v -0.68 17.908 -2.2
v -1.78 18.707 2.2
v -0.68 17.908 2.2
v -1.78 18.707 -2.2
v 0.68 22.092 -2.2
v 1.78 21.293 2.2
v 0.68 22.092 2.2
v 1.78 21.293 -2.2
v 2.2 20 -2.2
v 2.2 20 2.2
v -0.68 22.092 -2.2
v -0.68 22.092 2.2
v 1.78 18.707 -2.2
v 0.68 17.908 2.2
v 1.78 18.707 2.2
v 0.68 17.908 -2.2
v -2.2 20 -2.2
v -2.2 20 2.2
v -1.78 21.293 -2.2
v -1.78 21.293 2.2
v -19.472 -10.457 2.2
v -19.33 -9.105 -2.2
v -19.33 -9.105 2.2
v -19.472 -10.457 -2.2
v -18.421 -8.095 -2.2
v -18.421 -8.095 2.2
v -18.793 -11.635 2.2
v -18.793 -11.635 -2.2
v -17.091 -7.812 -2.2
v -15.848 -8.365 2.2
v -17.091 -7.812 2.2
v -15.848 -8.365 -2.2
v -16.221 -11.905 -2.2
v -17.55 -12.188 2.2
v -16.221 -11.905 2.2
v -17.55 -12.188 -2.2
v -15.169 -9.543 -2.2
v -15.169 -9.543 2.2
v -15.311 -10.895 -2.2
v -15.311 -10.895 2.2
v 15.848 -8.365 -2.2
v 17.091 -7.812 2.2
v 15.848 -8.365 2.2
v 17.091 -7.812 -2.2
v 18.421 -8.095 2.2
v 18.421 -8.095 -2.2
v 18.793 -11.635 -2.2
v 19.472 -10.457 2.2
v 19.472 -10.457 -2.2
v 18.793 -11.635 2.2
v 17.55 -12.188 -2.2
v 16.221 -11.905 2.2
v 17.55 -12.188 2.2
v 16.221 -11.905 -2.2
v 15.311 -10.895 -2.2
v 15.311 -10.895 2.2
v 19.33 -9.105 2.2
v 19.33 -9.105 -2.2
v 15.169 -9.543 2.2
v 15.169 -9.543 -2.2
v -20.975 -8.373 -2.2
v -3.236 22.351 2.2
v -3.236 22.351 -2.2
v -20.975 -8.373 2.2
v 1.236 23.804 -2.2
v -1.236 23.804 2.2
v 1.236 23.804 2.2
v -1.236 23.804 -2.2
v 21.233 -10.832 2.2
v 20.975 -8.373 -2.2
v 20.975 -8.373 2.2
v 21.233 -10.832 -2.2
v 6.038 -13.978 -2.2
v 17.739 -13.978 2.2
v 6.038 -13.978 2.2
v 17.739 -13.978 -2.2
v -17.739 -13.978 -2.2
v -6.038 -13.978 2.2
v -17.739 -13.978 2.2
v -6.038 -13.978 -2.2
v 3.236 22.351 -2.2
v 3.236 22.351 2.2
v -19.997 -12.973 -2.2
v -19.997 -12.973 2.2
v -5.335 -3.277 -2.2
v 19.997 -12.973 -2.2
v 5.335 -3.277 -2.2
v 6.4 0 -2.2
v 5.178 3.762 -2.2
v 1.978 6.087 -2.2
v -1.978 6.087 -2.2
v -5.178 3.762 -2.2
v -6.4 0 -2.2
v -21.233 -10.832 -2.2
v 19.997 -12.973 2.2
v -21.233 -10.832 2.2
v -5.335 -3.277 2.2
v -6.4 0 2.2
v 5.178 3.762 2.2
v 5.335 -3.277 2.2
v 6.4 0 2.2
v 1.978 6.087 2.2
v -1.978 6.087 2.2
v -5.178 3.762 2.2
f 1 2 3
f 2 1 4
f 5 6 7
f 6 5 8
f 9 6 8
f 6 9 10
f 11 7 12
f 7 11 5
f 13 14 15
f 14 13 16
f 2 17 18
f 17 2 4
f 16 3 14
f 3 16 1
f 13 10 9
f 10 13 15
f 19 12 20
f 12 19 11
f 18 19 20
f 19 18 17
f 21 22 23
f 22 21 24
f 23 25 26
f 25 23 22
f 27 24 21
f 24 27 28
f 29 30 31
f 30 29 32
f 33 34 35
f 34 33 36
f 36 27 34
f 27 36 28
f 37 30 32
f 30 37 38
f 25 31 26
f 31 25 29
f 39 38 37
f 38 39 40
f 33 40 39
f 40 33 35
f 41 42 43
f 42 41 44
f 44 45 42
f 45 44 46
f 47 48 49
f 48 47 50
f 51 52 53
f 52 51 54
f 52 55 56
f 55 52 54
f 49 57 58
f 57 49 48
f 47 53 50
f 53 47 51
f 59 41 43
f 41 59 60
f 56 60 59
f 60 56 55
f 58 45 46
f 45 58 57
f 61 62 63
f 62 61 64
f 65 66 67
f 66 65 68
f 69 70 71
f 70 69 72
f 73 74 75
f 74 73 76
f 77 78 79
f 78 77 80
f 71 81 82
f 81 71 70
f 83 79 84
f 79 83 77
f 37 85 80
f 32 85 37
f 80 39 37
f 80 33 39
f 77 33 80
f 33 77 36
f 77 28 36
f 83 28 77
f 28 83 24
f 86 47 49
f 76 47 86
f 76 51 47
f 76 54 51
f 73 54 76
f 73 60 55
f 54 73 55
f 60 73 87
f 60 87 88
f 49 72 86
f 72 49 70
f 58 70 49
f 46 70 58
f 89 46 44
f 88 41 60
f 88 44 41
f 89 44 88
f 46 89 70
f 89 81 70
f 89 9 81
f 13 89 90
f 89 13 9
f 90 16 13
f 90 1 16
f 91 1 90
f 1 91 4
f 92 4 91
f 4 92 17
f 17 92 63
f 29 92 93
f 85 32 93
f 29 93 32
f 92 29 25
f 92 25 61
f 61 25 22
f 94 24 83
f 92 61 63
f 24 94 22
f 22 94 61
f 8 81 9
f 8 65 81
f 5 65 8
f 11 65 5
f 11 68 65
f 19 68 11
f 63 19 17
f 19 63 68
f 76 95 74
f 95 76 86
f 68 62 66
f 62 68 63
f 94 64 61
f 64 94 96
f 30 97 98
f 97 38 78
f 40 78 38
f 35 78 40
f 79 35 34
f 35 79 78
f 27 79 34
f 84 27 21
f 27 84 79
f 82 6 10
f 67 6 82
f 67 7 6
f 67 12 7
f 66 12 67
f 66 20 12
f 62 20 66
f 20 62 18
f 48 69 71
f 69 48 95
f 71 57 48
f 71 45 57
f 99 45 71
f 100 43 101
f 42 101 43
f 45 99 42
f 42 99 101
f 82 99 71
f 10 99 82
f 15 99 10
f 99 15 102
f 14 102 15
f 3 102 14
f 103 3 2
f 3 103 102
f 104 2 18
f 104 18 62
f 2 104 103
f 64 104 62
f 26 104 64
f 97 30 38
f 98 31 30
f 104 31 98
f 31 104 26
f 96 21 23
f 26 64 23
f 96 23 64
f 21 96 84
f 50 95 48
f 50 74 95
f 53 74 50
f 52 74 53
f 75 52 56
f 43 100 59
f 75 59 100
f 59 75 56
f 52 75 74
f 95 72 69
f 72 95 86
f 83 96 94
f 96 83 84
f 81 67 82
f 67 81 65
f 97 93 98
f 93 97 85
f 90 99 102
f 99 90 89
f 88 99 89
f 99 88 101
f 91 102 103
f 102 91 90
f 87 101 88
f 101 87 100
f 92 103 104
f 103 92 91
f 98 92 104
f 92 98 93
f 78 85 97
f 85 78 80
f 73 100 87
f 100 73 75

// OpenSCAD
// file: configuration.scad
motor_end_height=44;
idler_end_height=28;
carriage_height=24;
platform_thickness=8;
bed_thickness=12;
pcb_thickness=2;
rod_length=120;
smooth_rod_length=300;
tower_radius = 120;
platform_hinge_offset=33;
carriage_hinge_offset=22;
// main file
include <configuration.scad>
h=4.4;
r=12/2+.4; //J-head mount radius
$fn=10;


module J_Head_Mount(){

	difference(){
		union(){
			hull(){
				for(a = [0:120:240]){
					rotate([0,0,a]) translate([0,20,0]) cylinder( r=4, h=h,center=true);
				}
			}
		}

		//Bolt holes
		for(a = [0:120:240]){
			rotate([0,0,a]) translate([0,20,0]) cylinder( r=2.2, h=h+1,center=true);
		}
	
		//Hotend hole w/ pathway thing
		cylinder(r=r,h=h+1,center=true);
		hull(){
			cylinder(r=r*.8,h=h+1,center=true);
			translate([0,-20,0]) cube([2*r,1,h+1],center=true);

		}

	}
}

J_Head_Mount();
